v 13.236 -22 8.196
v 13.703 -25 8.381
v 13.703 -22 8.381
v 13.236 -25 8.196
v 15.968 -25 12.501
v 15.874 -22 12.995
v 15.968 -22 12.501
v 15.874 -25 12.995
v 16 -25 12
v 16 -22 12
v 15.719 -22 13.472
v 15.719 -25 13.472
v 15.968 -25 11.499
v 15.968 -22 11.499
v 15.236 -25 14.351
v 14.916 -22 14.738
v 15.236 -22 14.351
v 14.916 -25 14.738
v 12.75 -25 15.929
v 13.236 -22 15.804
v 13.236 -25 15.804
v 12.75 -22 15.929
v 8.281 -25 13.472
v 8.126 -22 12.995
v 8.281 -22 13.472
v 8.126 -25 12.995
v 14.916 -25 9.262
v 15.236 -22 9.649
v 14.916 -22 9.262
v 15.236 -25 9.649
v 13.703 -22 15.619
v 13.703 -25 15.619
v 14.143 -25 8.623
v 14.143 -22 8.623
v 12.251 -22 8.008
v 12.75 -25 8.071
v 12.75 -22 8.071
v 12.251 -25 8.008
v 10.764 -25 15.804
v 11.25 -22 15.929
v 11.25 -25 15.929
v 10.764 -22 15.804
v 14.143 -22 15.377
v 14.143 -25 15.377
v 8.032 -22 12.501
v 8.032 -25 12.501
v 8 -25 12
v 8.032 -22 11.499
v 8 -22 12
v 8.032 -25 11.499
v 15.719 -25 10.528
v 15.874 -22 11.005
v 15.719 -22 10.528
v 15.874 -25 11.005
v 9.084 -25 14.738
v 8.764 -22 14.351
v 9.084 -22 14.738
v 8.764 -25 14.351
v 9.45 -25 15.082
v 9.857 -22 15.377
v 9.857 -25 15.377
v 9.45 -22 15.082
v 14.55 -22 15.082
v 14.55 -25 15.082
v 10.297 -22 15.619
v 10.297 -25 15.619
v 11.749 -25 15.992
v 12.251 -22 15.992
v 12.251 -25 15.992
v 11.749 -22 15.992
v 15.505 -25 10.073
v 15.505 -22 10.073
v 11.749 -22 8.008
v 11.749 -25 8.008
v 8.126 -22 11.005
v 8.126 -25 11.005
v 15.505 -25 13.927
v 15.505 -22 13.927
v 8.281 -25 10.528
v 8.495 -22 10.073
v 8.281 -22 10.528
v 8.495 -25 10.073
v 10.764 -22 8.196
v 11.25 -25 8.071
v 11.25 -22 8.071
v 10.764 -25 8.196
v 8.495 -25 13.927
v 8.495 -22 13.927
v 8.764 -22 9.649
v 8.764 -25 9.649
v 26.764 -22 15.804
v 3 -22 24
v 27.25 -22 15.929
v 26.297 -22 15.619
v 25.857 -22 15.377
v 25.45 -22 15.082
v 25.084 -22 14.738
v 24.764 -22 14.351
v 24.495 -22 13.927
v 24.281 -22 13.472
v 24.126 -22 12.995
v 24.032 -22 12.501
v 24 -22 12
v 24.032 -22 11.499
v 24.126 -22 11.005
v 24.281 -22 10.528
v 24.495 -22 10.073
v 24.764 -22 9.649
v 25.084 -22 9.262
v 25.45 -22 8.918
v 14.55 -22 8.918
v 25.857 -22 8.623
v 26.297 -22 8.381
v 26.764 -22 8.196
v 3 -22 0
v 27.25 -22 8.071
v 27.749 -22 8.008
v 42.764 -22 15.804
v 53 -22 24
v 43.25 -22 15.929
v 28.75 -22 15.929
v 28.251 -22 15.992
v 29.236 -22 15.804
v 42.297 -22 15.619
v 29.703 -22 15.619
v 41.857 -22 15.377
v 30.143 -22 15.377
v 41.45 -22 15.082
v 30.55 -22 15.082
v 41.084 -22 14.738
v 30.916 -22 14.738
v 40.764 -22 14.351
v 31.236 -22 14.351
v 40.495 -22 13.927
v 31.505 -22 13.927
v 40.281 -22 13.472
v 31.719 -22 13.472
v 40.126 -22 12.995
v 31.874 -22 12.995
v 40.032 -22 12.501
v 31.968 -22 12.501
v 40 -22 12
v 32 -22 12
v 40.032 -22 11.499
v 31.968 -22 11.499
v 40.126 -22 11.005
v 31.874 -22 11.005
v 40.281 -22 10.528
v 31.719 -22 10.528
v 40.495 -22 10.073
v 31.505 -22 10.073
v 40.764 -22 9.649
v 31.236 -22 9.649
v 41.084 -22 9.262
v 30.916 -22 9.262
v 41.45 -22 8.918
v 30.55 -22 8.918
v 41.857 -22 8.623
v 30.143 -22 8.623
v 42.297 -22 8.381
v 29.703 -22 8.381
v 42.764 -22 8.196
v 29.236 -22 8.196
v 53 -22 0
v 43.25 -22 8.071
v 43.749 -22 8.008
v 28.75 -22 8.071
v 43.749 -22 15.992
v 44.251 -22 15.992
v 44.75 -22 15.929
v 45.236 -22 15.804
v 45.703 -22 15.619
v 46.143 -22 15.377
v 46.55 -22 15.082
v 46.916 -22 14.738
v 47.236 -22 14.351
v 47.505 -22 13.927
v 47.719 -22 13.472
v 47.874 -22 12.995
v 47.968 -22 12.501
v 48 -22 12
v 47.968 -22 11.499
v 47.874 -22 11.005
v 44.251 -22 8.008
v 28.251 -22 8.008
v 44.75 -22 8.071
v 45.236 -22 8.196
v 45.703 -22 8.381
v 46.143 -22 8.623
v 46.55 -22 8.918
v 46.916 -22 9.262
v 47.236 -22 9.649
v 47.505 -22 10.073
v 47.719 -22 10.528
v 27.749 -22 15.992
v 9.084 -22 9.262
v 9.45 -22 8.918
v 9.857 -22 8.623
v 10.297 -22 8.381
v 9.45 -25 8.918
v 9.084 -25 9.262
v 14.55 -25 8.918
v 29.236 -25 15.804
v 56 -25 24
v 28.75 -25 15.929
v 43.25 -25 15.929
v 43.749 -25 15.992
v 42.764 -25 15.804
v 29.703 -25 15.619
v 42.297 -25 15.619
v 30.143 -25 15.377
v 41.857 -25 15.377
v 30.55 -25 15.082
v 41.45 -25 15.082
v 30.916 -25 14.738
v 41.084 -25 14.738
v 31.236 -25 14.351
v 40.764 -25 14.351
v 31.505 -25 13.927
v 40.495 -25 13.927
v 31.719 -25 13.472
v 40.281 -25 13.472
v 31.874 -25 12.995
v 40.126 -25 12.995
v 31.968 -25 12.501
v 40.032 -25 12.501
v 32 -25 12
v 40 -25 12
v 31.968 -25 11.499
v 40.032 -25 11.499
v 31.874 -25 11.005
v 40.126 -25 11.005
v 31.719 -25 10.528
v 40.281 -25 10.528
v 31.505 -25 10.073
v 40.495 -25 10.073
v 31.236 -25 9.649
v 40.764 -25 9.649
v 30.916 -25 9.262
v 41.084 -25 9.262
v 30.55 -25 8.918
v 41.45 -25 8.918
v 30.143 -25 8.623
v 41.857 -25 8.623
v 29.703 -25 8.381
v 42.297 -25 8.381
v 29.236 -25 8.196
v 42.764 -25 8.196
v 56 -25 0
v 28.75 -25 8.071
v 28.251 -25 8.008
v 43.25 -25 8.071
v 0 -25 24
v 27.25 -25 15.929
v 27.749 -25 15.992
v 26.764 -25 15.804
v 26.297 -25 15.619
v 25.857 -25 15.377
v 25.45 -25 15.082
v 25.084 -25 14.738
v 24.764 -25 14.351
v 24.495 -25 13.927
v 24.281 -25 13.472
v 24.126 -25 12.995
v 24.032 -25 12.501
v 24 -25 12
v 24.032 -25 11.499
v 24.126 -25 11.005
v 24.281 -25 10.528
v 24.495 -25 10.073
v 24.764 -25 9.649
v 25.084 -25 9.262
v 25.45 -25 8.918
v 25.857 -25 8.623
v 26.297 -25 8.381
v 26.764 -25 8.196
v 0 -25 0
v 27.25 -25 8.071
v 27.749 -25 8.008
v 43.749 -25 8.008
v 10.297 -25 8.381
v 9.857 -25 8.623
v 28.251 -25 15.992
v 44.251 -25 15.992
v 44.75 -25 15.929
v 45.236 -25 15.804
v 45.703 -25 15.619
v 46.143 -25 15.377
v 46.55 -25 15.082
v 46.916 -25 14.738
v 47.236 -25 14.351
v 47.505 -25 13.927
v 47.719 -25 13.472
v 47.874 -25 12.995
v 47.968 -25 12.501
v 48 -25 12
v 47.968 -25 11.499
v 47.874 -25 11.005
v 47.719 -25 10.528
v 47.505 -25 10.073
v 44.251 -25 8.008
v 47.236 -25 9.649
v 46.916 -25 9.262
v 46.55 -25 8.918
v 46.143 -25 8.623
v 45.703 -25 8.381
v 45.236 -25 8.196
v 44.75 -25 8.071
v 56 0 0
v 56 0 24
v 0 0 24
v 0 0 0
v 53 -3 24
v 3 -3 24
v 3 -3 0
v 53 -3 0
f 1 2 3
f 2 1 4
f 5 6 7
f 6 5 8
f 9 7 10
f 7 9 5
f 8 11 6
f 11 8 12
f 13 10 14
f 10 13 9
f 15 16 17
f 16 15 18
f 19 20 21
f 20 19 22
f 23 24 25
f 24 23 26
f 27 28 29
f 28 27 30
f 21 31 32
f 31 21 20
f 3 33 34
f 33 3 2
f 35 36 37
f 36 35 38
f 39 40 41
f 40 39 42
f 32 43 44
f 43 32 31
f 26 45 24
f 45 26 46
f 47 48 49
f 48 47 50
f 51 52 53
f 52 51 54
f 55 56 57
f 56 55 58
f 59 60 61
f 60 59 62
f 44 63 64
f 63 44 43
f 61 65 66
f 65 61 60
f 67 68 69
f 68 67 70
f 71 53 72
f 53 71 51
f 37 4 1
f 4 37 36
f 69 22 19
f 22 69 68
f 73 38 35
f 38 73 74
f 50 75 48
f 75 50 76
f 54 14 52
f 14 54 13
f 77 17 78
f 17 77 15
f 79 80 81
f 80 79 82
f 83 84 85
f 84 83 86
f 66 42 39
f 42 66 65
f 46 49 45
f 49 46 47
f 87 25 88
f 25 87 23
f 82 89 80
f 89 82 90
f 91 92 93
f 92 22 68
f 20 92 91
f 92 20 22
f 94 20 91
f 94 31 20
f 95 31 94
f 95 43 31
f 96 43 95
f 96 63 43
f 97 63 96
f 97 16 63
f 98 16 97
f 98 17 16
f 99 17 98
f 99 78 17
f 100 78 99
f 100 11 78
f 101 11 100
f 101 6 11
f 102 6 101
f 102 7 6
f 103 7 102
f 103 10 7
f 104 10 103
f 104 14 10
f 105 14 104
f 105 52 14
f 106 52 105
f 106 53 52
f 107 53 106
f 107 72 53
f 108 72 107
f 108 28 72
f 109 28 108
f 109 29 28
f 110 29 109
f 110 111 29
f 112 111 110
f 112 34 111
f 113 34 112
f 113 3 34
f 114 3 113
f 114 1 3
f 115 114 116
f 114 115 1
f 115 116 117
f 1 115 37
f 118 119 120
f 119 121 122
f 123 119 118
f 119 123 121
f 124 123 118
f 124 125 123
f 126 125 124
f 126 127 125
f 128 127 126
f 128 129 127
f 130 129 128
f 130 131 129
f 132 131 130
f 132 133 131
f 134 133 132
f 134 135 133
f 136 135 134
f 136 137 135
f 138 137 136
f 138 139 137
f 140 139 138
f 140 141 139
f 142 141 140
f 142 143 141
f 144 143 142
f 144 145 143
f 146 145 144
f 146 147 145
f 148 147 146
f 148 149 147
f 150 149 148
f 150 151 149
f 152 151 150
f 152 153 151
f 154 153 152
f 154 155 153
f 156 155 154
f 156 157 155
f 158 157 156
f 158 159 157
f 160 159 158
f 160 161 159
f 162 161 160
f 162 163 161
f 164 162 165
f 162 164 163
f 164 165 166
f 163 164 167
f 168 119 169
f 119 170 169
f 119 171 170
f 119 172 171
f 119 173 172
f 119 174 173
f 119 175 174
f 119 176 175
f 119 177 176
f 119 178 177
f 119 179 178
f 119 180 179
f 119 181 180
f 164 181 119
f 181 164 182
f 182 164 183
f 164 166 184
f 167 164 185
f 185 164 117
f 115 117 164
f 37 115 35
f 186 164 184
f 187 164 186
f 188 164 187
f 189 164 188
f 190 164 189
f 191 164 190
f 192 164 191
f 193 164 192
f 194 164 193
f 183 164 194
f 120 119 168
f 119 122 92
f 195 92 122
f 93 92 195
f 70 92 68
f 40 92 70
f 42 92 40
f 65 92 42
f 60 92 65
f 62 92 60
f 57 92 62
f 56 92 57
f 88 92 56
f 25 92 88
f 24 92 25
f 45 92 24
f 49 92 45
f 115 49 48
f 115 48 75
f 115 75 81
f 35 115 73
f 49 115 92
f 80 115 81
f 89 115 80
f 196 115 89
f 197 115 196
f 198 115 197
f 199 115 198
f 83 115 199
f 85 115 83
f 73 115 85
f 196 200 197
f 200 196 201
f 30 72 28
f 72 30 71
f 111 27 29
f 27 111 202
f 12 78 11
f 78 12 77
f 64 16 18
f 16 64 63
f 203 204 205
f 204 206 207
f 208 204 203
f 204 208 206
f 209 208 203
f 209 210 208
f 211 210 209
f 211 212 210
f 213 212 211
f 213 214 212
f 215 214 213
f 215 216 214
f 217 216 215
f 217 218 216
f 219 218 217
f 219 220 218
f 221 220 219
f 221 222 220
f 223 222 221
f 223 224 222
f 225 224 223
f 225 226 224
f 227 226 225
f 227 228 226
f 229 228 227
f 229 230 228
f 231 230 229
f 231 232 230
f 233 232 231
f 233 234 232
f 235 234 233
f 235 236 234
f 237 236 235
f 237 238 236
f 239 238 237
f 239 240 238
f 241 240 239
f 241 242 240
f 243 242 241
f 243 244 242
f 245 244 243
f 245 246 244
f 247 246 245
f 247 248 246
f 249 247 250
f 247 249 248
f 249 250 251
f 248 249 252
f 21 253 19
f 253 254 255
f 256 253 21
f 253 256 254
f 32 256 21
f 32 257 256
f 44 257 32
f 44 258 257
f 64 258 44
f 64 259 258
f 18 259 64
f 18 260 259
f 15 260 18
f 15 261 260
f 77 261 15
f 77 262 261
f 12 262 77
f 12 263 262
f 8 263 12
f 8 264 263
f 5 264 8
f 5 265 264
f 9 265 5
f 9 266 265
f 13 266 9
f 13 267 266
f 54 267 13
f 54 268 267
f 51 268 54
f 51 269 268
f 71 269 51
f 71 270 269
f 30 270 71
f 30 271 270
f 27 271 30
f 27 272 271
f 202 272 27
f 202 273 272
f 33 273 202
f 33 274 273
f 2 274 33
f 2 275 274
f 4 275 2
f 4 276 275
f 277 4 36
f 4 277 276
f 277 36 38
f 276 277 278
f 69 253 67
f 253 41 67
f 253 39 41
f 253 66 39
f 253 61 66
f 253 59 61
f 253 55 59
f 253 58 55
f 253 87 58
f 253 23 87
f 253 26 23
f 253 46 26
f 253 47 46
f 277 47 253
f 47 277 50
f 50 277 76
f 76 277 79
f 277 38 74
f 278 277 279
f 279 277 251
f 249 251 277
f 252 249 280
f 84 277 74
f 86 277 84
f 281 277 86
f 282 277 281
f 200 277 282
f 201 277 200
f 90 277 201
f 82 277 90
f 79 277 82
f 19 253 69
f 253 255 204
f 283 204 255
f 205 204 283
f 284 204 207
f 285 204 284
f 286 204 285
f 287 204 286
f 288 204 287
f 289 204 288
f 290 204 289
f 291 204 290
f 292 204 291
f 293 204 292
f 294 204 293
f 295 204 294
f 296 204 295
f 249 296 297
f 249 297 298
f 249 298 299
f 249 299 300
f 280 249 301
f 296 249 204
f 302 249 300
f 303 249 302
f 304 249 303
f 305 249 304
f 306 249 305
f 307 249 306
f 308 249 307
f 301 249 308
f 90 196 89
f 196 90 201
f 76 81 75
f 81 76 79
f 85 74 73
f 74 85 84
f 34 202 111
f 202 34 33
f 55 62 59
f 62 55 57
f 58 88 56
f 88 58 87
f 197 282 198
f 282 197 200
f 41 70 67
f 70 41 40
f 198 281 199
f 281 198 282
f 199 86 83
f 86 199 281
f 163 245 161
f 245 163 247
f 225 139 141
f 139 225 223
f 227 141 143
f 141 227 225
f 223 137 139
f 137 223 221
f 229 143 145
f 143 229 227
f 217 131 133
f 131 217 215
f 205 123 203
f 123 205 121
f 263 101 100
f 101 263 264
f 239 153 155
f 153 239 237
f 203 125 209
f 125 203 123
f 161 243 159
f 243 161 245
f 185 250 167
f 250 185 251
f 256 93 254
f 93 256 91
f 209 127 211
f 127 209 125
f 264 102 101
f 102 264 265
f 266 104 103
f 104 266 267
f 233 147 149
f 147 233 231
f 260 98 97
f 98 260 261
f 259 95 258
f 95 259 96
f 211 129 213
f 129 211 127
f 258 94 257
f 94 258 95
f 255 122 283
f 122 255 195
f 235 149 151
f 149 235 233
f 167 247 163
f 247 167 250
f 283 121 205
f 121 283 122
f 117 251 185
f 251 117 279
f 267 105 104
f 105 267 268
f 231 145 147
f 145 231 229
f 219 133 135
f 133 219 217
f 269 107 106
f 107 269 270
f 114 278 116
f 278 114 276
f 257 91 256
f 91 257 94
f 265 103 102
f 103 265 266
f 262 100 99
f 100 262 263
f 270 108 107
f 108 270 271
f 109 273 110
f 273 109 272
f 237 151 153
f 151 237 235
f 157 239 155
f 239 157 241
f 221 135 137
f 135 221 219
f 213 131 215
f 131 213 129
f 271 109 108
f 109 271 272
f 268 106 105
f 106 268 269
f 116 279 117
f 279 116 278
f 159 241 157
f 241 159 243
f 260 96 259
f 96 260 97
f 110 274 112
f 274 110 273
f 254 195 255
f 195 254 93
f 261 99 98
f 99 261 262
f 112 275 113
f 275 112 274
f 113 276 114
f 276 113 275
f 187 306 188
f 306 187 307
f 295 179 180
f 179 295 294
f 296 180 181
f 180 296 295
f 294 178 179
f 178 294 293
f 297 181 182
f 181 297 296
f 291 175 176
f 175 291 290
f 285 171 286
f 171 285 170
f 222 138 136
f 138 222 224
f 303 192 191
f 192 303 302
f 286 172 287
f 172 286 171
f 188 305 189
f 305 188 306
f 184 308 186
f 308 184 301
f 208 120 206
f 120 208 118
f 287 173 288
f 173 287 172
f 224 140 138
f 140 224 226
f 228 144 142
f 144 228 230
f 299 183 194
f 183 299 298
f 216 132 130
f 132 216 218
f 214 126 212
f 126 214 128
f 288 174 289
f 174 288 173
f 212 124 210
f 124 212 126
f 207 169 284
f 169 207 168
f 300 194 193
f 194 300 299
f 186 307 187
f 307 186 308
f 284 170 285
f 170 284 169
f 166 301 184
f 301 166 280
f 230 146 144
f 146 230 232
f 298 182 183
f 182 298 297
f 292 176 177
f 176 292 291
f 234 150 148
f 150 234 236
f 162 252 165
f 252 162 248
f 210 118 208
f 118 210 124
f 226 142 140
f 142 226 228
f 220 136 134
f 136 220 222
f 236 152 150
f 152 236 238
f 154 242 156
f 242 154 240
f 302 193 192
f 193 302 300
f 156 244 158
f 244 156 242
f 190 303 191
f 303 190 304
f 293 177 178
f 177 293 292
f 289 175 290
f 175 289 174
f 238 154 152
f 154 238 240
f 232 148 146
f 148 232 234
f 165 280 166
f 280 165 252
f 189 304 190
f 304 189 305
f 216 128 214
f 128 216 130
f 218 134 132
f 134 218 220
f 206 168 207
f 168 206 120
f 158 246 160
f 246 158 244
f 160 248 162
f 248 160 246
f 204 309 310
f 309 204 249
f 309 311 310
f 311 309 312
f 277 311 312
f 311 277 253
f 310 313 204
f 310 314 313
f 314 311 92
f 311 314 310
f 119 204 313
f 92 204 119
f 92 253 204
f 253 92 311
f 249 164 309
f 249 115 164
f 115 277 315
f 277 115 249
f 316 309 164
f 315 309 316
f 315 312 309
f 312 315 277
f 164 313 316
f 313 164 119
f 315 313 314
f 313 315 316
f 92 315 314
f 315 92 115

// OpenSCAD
holes=3;
diameter=8;
thickness=3;
height=25;

rotate([90, 0, 0]) {
	difference() {
		cube([diameter*(holes*2+1), diameter*thickness, height]);
	
		translate([thickness, 0, thickness]) {
			cube([diameter*(holes*2+1)-2*thickness, diameter*thickness, height-thickness*2]);
		}
	
		for (i = [1 : holes]) {
			translate([diameter/2+diameter*(2*i-1), diameter*1.5, height-thickness]) {
				cylinder(r=diameter/2, h=thickness, $fn=50);
			}
		}
	}
}
